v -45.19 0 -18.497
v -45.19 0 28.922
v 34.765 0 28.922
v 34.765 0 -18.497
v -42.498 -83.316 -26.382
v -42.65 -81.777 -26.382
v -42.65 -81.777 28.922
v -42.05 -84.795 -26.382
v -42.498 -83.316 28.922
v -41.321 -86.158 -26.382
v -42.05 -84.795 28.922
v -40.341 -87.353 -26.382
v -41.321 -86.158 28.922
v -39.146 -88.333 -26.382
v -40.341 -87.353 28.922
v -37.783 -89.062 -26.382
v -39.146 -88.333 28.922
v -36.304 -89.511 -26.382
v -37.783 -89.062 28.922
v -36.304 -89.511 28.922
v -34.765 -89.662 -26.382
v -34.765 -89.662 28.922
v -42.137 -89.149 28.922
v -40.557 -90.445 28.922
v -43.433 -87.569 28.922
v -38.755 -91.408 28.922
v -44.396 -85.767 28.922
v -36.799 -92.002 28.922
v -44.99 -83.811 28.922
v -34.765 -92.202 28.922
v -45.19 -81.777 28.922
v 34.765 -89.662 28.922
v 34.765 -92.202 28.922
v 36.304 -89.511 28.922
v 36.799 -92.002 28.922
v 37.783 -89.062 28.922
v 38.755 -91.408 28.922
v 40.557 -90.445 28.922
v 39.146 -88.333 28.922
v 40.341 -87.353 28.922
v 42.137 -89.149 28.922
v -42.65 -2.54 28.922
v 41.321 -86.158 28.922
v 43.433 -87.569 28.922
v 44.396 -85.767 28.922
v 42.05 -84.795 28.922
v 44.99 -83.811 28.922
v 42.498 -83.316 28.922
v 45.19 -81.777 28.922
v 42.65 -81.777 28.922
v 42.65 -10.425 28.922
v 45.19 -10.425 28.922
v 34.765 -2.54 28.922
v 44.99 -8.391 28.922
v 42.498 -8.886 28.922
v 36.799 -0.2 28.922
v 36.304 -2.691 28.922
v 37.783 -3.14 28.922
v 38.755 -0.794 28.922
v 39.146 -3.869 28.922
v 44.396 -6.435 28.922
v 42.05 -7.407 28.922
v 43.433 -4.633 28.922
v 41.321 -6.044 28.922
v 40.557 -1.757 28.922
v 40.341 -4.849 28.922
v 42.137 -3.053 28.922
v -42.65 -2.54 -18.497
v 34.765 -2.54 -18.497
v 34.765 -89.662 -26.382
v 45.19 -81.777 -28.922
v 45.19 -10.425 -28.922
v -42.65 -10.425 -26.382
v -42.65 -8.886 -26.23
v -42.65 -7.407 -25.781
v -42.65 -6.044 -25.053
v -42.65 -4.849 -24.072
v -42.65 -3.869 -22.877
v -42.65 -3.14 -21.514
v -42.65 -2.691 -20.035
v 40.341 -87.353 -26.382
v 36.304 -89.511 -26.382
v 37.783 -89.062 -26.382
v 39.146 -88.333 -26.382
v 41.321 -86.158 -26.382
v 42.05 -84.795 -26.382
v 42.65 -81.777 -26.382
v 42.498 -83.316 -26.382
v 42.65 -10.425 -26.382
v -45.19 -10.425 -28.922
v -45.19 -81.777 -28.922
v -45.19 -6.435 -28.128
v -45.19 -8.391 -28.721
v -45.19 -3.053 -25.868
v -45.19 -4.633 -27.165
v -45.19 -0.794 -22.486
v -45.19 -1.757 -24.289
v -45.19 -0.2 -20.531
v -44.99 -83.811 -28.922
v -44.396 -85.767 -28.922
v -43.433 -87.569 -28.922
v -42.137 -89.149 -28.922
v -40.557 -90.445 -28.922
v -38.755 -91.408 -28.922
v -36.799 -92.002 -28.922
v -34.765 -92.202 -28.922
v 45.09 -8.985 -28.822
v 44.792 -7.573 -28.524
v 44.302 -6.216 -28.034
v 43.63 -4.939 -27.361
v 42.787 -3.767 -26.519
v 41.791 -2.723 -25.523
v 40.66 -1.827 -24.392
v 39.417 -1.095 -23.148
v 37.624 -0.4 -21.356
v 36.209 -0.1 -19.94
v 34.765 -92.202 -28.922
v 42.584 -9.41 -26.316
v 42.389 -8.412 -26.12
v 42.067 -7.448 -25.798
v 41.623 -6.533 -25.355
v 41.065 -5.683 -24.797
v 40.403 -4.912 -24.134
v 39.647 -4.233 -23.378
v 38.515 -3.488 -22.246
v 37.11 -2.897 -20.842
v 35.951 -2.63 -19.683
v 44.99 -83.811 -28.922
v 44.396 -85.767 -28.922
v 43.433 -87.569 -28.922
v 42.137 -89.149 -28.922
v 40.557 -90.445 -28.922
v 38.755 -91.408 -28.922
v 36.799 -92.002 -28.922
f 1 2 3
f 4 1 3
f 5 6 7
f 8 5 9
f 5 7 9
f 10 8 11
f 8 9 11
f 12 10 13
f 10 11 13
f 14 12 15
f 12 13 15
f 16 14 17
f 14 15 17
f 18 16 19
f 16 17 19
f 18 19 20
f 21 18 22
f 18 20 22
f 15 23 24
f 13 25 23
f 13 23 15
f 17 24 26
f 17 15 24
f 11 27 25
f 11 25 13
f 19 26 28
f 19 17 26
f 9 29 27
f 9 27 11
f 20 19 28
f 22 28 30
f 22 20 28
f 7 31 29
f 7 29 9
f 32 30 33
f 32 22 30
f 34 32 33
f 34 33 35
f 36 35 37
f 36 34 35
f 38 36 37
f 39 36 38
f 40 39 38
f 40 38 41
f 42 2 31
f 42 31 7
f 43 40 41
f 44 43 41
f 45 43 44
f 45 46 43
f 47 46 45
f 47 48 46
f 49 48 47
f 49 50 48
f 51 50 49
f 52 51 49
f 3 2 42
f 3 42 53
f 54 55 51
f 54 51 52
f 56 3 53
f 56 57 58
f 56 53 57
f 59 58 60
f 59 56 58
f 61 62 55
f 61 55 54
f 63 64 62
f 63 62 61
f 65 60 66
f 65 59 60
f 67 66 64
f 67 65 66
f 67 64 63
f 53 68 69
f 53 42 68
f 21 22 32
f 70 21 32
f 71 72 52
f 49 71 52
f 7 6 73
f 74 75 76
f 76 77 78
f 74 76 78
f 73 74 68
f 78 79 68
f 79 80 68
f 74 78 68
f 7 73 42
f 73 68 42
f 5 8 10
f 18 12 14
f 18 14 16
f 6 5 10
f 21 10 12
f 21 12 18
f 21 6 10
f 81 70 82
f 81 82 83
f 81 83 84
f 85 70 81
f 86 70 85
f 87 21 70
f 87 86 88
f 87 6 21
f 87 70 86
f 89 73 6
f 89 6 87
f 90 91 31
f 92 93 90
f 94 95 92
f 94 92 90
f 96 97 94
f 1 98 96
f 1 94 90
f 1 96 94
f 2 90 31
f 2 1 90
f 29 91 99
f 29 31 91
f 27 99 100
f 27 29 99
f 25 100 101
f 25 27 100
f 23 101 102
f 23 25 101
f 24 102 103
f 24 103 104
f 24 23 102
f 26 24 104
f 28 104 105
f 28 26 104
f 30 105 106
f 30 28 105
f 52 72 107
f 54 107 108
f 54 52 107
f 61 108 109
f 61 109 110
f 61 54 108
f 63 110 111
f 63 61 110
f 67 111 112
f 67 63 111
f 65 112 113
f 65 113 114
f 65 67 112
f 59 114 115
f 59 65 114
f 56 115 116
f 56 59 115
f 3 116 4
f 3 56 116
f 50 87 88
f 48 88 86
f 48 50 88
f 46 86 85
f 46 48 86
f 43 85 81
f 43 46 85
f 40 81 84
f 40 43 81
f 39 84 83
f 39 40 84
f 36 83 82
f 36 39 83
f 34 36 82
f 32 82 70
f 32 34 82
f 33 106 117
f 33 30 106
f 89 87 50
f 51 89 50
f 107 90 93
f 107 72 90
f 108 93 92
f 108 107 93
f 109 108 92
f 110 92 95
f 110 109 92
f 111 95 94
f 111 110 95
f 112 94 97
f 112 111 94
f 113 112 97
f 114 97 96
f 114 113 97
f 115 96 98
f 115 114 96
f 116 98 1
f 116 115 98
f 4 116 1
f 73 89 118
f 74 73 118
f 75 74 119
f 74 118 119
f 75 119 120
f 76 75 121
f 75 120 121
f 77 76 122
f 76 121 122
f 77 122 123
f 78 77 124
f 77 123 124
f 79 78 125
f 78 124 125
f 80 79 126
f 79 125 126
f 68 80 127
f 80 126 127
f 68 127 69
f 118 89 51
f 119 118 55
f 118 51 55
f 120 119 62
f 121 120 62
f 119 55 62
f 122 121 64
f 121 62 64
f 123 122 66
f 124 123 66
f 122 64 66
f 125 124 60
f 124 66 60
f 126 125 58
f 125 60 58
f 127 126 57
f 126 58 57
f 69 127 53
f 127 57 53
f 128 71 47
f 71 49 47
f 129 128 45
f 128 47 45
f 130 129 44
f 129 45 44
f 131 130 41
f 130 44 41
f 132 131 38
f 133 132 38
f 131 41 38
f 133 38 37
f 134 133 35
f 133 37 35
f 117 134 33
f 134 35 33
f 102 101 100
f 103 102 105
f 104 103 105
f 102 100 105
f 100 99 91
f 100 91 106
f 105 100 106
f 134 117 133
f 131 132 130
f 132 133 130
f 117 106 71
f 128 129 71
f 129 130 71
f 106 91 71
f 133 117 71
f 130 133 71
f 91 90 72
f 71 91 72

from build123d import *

# Parameters (mm, degrees)
F0_W     = 90.379902
F0_H     = 57.843138
F1_DEPTH = 92.202
F2_R     = 10.424574
F3_T     = -2.54


with BuildPart() as f1:
    # F0 (on Front) → F1 (new body)
    with BuildSketch(Plane.XZ):
        Rectangle(F0_W, F0_H)
    extrude(amount=F1_DEPTH)

    # F2
    f2_edges = [f1.edges().sort_by_distance(p)[0] for p in [
        (45.189951, -92.202, 0),
        (-45.189951, -92.202, 0),
        (45.189951, 0, 0),
        (0, 0, -28.921569),
    ]]
    fillet(f2_edges, radius=F2_R)

    # F3
    f3_openings = [f1.faces().sort_by_distance(p)[0] for p in [
        (-0.120967, -45.977462, 28.921569),
    ]]
    offset(amount=F3_T, openings=f3_openings)


solid = f1.part
